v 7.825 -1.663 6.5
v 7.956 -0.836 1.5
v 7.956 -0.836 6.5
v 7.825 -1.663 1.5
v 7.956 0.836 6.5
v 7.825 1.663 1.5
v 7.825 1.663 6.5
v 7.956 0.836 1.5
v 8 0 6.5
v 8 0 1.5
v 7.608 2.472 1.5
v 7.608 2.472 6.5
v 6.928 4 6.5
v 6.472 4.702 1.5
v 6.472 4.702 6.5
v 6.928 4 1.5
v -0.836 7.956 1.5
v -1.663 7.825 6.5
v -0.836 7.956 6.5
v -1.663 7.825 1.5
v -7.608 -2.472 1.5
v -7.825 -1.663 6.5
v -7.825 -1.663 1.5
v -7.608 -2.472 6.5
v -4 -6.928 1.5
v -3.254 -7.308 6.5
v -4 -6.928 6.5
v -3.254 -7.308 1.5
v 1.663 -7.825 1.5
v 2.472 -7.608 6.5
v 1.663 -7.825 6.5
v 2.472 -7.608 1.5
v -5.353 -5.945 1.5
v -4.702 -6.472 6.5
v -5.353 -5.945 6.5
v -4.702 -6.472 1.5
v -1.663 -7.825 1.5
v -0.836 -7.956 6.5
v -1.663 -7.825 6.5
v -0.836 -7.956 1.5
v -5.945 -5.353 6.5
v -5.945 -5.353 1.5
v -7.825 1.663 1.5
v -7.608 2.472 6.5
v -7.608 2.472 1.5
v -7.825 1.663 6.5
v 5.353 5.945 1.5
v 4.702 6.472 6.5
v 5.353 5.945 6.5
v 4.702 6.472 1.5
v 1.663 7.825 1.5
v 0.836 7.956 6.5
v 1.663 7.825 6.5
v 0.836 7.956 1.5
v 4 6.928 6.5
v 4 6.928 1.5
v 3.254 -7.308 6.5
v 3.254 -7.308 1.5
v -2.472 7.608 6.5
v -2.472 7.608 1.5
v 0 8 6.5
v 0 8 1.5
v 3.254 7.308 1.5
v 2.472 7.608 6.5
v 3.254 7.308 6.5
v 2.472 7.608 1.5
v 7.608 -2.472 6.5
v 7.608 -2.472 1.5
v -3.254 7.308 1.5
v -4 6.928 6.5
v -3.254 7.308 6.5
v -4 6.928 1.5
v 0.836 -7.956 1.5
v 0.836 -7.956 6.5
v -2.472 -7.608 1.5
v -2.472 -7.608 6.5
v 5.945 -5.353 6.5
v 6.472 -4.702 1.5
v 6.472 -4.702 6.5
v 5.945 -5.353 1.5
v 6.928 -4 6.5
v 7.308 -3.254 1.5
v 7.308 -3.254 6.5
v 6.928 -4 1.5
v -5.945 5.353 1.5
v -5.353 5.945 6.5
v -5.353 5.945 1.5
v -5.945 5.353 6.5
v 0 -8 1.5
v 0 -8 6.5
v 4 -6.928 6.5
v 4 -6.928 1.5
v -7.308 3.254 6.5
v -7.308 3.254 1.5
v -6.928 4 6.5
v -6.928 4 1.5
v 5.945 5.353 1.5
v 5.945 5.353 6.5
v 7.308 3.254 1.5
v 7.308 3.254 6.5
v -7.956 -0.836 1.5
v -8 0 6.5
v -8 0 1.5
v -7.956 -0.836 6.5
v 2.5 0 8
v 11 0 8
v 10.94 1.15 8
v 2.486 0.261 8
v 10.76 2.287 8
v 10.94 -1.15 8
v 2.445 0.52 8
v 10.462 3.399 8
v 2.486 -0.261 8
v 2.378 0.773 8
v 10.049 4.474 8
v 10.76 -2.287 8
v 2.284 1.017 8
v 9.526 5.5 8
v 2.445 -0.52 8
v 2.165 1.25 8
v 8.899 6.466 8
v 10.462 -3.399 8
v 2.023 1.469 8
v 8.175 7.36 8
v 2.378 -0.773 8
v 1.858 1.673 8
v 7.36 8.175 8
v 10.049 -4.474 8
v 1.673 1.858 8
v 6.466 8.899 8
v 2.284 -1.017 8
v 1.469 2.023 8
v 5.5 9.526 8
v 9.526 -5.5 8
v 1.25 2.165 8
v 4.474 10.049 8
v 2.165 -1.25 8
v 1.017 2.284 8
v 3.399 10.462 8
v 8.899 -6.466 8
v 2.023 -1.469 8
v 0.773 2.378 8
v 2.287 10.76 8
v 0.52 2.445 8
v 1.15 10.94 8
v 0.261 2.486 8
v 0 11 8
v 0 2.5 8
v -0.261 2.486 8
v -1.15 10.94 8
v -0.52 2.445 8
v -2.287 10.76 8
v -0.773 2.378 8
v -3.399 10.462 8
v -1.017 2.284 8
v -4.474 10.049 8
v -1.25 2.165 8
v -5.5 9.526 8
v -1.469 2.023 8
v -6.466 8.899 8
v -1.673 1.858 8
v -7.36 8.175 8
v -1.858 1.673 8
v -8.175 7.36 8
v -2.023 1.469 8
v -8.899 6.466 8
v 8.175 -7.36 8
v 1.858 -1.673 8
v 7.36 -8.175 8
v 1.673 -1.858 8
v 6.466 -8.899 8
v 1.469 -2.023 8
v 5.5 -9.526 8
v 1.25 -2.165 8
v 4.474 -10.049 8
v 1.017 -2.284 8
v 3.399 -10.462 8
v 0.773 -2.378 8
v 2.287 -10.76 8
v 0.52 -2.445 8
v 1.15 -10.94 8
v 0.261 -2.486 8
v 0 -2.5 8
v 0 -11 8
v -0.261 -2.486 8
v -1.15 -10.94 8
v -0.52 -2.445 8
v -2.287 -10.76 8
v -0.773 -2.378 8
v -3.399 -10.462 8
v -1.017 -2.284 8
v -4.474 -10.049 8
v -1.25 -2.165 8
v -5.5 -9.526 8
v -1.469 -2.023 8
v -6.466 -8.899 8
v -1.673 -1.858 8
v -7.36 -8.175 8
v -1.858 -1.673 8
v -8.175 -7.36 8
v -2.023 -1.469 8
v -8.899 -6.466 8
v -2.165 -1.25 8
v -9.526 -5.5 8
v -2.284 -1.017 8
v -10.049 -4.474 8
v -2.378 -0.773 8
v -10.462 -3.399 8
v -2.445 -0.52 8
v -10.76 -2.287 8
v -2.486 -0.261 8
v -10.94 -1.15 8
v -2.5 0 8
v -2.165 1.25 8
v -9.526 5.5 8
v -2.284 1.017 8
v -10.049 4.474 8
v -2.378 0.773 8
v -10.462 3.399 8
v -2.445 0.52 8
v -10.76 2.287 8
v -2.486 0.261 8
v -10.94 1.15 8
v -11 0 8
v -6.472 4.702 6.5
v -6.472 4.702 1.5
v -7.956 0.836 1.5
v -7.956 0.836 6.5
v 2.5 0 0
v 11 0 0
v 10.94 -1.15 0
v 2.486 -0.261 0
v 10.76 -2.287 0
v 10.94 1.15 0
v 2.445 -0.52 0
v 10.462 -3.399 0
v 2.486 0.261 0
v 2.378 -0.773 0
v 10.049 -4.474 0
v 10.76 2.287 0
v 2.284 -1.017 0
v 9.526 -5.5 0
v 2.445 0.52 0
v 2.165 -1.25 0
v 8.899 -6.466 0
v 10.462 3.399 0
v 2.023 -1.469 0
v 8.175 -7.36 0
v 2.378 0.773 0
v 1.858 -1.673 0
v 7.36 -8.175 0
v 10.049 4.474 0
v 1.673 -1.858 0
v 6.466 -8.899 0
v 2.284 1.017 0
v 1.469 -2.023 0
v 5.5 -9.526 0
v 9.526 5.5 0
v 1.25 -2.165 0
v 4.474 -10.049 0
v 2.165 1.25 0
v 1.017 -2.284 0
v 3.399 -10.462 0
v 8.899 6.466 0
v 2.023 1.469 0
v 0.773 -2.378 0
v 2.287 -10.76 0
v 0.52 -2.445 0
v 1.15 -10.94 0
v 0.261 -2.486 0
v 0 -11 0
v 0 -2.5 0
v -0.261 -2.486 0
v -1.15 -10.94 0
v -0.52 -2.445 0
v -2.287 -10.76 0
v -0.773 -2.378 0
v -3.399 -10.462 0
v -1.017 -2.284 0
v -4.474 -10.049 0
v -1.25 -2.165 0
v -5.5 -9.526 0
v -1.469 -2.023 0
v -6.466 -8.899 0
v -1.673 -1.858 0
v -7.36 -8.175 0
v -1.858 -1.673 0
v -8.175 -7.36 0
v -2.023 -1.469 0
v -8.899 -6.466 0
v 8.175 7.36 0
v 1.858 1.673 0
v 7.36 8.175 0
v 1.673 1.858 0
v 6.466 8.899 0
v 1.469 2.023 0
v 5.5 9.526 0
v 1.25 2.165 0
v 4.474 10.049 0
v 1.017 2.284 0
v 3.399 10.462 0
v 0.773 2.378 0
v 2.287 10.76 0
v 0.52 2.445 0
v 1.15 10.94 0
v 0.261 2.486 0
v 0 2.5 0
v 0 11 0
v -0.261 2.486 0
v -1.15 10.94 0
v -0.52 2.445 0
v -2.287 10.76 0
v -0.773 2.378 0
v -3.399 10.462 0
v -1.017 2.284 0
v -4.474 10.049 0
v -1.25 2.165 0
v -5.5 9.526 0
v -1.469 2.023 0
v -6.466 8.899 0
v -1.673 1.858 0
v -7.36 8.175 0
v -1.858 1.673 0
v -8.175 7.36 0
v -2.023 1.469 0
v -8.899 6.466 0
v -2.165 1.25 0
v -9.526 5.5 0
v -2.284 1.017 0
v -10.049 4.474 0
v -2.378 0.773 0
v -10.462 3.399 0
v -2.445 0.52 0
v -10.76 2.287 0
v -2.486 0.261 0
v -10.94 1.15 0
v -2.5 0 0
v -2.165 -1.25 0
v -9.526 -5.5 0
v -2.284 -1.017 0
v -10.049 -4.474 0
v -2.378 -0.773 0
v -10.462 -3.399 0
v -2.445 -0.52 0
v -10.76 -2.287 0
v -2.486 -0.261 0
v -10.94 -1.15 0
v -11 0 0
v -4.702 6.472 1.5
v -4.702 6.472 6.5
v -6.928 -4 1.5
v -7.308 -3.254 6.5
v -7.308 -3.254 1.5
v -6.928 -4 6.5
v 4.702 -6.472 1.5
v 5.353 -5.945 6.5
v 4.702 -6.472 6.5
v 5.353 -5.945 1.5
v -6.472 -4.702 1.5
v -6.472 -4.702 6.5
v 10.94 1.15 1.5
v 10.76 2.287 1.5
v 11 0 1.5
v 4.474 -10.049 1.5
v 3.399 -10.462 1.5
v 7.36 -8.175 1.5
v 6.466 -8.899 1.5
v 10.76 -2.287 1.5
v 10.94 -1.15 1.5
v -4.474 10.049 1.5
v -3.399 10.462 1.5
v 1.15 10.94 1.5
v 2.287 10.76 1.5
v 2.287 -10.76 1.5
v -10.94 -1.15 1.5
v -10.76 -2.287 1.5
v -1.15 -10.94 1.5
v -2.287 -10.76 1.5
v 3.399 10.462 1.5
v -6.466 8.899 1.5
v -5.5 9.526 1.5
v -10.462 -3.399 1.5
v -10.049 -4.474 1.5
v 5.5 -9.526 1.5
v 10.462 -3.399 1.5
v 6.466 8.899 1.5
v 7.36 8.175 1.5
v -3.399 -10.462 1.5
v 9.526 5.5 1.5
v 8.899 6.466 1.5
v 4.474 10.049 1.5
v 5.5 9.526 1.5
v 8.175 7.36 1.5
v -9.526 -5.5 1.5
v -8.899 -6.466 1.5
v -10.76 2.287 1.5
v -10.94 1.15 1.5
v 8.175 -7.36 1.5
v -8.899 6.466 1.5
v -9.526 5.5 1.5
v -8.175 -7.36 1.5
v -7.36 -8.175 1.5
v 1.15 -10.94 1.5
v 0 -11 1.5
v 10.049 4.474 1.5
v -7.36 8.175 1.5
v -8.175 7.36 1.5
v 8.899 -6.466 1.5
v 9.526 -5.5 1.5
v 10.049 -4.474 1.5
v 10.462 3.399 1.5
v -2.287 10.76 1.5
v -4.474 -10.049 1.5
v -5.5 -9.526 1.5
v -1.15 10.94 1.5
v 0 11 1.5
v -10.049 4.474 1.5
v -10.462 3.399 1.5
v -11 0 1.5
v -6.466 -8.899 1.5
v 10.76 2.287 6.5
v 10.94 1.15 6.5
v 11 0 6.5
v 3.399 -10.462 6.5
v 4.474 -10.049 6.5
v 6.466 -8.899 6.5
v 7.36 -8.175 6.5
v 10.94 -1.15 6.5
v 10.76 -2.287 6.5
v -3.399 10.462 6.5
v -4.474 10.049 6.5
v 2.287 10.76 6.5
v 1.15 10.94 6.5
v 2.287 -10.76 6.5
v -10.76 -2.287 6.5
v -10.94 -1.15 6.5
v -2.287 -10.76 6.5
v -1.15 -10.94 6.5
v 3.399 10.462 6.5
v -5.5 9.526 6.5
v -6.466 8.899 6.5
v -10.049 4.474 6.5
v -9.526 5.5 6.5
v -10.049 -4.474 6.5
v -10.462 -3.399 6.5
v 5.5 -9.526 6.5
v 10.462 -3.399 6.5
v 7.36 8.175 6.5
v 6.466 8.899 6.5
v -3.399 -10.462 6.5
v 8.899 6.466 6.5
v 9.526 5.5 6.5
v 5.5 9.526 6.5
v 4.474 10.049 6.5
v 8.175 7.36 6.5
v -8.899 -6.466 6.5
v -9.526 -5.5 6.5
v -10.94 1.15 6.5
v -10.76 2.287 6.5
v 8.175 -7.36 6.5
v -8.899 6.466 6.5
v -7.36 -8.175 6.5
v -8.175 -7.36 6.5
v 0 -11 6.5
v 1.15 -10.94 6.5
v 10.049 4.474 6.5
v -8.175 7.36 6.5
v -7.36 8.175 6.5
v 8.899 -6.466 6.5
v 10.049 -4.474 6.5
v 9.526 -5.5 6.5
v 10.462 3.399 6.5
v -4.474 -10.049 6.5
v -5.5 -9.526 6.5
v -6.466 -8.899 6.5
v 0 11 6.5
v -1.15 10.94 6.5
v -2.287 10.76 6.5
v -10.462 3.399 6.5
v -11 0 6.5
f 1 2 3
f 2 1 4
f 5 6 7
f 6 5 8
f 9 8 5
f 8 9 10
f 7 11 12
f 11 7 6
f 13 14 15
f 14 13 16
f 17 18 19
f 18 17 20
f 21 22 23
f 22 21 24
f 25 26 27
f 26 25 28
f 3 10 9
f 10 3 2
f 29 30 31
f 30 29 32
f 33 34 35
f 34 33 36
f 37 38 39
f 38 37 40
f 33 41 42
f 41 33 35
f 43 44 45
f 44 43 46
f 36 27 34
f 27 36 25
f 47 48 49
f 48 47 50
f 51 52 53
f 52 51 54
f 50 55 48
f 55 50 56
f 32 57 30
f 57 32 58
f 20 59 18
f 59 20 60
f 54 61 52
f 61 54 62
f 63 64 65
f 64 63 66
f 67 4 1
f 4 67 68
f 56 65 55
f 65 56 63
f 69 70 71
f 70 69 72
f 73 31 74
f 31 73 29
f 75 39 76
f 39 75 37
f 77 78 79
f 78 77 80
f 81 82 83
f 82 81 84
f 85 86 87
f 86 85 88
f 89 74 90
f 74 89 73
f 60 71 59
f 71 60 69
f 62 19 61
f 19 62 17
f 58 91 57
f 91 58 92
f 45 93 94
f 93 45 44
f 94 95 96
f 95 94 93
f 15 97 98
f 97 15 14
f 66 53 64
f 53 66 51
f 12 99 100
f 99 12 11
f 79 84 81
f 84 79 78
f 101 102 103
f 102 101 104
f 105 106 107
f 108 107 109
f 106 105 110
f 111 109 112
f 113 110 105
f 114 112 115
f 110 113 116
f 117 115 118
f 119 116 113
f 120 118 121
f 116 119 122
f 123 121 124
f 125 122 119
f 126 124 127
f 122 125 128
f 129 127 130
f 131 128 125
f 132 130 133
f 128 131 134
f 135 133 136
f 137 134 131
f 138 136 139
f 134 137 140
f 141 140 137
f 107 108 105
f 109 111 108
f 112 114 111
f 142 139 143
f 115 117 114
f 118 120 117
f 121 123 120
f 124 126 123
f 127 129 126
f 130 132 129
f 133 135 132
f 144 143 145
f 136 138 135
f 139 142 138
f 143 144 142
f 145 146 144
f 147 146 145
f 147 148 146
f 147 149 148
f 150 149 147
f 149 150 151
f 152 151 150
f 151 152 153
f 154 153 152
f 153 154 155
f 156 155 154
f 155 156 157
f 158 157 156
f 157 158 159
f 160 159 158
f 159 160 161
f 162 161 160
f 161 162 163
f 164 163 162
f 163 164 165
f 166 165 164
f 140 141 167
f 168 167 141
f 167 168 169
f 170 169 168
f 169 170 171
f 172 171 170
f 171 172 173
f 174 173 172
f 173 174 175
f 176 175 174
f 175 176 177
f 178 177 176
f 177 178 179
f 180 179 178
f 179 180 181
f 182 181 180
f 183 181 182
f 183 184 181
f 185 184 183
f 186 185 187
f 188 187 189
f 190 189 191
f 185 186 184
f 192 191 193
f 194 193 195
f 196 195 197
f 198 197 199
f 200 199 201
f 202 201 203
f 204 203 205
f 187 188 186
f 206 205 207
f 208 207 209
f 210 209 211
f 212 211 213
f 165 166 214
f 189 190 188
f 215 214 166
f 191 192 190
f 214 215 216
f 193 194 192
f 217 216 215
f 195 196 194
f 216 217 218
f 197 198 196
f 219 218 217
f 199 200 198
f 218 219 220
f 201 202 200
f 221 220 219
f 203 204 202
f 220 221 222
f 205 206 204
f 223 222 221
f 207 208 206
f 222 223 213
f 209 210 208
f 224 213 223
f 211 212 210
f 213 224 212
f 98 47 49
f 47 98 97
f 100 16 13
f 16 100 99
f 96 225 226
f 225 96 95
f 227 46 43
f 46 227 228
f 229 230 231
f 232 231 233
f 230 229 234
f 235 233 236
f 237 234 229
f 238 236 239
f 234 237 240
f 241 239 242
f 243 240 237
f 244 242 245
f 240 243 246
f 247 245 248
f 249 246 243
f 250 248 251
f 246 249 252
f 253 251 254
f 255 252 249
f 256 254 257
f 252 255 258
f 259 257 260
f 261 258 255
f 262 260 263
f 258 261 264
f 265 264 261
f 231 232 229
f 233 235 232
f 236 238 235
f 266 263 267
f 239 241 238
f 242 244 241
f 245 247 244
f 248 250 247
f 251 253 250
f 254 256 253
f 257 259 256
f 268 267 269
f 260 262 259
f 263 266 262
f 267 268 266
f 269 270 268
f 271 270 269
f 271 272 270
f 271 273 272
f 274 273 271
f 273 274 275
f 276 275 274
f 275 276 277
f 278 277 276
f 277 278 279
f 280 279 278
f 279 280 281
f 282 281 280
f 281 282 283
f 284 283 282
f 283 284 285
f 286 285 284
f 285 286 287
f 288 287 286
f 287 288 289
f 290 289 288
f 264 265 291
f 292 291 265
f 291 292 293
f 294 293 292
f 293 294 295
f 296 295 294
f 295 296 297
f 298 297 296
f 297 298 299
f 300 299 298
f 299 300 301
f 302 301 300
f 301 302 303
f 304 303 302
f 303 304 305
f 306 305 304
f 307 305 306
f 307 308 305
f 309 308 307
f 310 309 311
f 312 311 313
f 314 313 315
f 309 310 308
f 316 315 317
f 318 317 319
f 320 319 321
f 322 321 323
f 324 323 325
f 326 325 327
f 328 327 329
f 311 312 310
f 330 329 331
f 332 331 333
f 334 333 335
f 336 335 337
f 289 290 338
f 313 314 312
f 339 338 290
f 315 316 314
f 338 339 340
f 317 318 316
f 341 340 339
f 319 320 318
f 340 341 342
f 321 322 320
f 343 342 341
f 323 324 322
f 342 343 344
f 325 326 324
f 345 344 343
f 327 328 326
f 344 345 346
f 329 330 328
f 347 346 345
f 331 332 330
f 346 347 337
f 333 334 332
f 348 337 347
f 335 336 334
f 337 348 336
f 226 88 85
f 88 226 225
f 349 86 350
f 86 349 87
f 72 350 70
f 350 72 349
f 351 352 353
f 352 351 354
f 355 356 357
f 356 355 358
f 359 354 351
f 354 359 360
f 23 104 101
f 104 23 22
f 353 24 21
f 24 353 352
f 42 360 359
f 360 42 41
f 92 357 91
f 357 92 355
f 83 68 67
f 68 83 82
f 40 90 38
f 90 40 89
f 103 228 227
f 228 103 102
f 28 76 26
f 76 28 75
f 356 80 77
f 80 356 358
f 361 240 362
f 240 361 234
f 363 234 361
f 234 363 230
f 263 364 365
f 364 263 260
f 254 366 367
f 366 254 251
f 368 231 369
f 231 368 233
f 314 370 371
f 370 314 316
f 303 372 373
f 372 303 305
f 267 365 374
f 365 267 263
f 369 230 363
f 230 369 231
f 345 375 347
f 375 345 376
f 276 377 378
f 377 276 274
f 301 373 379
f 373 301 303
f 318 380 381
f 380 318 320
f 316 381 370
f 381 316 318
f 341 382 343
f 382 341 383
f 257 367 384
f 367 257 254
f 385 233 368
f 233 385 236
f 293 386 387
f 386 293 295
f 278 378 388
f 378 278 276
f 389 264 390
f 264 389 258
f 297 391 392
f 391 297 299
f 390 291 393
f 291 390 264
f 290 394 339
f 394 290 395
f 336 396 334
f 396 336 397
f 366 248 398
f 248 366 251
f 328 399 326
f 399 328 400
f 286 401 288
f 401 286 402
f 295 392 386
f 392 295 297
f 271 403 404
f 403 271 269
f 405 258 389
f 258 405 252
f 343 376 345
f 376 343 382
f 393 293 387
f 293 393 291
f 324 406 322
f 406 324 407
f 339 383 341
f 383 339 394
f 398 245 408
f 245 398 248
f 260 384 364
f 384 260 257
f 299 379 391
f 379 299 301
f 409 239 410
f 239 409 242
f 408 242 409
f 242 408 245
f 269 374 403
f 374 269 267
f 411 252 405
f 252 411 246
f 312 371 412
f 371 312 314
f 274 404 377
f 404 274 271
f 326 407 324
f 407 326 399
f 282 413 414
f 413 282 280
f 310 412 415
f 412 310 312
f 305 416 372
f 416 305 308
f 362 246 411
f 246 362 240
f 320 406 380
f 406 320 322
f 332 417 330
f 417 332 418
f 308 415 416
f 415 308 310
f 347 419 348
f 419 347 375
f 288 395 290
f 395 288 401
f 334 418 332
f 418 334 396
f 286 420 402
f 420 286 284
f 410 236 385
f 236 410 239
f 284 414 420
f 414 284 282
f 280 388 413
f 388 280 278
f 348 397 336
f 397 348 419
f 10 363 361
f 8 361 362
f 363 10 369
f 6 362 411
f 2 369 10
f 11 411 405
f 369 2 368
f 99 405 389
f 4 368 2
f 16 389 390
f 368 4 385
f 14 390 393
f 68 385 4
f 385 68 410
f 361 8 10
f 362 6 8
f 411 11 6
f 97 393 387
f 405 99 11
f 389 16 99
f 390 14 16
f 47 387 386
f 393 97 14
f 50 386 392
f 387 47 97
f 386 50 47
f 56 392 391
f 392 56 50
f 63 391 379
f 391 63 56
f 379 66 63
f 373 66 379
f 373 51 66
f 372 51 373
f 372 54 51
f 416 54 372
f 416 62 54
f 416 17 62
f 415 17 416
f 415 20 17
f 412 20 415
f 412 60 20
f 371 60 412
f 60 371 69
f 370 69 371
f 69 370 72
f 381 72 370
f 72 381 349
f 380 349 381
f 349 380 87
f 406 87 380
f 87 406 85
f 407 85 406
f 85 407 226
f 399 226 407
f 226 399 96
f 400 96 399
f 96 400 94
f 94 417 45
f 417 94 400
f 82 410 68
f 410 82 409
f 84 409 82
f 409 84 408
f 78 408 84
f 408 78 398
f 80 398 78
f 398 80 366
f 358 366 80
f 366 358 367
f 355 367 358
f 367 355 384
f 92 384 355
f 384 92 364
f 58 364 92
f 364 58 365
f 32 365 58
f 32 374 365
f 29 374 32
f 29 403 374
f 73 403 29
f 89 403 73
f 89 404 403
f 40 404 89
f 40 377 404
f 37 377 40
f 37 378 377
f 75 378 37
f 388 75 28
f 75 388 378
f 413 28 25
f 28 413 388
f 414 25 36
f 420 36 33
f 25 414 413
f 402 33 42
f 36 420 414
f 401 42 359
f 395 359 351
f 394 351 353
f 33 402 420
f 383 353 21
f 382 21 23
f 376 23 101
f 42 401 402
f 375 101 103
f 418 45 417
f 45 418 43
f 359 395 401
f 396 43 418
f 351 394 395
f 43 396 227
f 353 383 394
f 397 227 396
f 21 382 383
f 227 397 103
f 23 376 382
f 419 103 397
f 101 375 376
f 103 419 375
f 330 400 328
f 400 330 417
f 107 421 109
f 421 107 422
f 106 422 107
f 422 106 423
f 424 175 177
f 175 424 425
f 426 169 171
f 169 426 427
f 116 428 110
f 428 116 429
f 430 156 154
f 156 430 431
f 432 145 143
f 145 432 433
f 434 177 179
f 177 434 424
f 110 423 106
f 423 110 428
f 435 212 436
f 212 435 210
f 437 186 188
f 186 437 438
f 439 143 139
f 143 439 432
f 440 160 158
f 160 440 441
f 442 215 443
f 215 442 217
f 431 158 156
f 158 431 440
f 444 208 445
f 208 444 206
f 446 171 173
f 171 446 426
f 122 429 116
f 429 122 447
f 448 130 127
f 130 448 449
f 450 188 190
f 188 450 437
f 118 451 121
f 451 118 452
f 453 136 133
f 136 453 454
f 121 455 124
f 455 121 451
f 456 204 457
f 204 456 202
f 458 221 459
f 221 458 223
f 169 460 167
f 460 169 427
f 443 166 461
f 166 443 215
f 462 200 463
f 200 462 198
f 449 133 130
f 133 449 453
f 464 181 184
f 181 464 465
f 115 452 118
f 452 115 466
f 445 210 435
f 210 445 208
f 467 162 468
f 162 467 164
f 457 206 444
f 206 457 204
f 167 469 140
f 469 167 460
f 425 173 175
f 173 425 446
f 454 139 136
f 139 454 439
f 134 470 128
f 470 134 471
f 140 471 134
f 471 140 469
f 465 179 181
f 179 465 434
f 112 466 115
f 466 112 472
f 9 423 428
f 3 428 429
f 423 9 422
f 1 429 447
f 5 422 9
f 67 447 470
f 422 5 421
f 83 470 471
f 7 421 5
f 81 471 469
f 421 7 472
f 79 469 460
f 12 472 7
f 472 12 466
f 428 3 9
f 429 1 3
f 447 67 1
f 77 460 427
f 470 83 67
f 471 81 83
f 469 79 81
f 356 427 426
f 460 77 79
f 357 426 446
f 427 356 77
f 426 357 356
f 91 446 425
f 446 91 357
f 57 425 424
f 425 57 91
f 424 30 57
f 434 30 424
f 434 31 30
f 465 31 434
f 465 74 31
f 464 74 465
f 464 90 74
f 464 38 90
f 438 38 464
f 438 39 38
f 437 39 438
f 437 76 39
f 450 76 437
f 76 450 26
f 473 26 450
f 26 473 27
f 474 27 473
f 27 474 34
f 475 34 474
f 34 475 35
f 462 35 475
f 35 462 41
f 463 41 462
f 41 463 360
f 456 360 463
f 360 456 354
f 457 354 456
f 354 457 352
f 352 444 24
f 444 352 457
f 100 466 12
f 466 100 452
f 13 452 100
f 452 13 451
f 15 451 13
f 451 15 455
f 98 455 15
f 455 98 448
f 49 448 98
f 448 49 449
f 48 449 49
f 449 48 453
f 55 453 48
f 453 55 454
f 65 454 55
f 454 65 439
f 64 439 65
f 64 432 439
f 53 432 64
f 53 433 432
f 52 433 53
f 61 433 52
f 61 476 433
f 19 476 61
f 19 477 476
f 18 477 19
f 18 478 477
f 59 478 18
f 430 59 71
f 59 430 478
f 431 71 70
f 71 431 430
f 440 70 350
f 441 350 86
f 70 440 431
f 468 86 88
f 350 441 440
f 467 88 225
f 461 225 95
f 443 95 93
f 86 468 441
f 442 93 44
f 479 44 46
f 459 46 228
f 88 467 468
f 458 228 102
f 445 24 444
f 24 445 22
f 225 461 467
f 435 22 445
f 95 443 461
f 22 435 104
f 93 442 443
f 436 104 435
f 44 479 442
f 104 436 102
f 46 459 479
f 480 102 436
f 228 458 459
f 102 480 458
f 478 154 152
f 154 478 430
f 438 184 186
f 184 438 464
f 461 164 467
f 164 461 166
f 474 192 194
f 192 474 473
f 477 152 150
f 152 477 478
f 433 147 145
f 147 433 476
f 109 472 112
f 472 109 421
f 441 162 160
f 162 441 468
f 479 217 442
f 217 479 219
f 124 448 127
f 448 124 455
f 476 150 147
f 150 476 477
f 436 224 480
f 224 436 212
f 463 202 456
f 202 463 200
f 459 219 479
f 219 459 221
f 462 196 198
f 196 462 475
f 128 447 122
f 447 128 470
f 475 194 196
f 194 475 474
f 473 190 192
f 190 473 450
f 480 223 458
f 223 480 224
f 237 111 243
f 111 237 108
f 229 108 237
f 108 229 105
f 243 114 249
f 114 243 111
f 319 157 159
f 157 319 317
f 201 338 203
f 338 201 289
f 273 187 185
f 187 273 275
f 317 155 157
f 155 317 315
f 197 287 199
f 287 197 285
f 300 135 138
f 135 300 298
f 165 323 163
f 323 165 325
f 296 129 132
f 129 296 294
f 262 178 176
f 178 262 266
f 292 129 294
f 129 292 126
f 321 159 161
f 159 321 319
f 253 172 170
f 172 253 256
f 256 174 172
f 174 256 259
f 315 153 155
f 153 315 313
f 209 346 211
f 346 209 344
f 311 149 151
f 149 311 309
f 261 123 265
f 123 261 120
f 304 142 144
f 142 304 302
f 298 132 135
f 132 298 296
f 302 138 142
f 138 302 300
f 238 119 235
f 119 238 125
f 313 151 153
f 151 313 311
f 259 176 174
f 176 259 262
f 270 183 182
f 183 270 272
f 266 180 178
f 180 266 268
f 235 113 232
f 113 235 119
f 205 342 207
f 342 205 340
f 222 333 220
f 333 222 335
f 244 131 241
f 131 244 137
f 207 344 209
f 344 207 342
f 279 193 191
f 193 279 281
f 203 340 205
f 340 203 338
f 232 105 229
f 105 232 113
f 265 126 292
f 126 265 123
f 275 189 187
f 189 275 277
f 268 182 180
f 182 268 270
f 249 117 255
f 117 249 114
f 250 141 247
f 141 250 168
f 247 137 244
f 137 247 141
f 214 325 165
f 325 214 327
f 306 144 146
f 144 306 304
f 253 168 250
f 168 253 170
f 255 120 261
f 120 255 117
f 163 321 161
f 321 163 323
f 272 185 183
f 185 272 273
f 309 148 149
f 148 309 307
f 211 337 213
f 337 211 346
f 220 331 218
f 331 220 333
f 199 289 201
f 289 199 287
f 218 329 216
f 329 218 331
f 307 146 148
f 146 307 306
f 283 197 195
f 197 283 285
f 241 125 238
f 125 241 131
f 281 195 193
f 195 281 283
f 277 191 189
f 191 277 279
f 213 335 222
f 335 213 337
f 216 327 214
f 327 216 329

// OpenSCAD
// Belt-guide pulley flange.
$fn = 60;
eps = 0.02;
bore_d = 5;
body_d = 16;
width = 8;
difference() { union() { cylinder(d=body_d,h=width); cylinder(d=body_d+6,h=1.5); translate([0,0,width-1.5]) cylinder(d=body_d+6,h=1.5); } translate([0,0,-eps]) cylinder(d=bore_d,h=width+2*eps); }
